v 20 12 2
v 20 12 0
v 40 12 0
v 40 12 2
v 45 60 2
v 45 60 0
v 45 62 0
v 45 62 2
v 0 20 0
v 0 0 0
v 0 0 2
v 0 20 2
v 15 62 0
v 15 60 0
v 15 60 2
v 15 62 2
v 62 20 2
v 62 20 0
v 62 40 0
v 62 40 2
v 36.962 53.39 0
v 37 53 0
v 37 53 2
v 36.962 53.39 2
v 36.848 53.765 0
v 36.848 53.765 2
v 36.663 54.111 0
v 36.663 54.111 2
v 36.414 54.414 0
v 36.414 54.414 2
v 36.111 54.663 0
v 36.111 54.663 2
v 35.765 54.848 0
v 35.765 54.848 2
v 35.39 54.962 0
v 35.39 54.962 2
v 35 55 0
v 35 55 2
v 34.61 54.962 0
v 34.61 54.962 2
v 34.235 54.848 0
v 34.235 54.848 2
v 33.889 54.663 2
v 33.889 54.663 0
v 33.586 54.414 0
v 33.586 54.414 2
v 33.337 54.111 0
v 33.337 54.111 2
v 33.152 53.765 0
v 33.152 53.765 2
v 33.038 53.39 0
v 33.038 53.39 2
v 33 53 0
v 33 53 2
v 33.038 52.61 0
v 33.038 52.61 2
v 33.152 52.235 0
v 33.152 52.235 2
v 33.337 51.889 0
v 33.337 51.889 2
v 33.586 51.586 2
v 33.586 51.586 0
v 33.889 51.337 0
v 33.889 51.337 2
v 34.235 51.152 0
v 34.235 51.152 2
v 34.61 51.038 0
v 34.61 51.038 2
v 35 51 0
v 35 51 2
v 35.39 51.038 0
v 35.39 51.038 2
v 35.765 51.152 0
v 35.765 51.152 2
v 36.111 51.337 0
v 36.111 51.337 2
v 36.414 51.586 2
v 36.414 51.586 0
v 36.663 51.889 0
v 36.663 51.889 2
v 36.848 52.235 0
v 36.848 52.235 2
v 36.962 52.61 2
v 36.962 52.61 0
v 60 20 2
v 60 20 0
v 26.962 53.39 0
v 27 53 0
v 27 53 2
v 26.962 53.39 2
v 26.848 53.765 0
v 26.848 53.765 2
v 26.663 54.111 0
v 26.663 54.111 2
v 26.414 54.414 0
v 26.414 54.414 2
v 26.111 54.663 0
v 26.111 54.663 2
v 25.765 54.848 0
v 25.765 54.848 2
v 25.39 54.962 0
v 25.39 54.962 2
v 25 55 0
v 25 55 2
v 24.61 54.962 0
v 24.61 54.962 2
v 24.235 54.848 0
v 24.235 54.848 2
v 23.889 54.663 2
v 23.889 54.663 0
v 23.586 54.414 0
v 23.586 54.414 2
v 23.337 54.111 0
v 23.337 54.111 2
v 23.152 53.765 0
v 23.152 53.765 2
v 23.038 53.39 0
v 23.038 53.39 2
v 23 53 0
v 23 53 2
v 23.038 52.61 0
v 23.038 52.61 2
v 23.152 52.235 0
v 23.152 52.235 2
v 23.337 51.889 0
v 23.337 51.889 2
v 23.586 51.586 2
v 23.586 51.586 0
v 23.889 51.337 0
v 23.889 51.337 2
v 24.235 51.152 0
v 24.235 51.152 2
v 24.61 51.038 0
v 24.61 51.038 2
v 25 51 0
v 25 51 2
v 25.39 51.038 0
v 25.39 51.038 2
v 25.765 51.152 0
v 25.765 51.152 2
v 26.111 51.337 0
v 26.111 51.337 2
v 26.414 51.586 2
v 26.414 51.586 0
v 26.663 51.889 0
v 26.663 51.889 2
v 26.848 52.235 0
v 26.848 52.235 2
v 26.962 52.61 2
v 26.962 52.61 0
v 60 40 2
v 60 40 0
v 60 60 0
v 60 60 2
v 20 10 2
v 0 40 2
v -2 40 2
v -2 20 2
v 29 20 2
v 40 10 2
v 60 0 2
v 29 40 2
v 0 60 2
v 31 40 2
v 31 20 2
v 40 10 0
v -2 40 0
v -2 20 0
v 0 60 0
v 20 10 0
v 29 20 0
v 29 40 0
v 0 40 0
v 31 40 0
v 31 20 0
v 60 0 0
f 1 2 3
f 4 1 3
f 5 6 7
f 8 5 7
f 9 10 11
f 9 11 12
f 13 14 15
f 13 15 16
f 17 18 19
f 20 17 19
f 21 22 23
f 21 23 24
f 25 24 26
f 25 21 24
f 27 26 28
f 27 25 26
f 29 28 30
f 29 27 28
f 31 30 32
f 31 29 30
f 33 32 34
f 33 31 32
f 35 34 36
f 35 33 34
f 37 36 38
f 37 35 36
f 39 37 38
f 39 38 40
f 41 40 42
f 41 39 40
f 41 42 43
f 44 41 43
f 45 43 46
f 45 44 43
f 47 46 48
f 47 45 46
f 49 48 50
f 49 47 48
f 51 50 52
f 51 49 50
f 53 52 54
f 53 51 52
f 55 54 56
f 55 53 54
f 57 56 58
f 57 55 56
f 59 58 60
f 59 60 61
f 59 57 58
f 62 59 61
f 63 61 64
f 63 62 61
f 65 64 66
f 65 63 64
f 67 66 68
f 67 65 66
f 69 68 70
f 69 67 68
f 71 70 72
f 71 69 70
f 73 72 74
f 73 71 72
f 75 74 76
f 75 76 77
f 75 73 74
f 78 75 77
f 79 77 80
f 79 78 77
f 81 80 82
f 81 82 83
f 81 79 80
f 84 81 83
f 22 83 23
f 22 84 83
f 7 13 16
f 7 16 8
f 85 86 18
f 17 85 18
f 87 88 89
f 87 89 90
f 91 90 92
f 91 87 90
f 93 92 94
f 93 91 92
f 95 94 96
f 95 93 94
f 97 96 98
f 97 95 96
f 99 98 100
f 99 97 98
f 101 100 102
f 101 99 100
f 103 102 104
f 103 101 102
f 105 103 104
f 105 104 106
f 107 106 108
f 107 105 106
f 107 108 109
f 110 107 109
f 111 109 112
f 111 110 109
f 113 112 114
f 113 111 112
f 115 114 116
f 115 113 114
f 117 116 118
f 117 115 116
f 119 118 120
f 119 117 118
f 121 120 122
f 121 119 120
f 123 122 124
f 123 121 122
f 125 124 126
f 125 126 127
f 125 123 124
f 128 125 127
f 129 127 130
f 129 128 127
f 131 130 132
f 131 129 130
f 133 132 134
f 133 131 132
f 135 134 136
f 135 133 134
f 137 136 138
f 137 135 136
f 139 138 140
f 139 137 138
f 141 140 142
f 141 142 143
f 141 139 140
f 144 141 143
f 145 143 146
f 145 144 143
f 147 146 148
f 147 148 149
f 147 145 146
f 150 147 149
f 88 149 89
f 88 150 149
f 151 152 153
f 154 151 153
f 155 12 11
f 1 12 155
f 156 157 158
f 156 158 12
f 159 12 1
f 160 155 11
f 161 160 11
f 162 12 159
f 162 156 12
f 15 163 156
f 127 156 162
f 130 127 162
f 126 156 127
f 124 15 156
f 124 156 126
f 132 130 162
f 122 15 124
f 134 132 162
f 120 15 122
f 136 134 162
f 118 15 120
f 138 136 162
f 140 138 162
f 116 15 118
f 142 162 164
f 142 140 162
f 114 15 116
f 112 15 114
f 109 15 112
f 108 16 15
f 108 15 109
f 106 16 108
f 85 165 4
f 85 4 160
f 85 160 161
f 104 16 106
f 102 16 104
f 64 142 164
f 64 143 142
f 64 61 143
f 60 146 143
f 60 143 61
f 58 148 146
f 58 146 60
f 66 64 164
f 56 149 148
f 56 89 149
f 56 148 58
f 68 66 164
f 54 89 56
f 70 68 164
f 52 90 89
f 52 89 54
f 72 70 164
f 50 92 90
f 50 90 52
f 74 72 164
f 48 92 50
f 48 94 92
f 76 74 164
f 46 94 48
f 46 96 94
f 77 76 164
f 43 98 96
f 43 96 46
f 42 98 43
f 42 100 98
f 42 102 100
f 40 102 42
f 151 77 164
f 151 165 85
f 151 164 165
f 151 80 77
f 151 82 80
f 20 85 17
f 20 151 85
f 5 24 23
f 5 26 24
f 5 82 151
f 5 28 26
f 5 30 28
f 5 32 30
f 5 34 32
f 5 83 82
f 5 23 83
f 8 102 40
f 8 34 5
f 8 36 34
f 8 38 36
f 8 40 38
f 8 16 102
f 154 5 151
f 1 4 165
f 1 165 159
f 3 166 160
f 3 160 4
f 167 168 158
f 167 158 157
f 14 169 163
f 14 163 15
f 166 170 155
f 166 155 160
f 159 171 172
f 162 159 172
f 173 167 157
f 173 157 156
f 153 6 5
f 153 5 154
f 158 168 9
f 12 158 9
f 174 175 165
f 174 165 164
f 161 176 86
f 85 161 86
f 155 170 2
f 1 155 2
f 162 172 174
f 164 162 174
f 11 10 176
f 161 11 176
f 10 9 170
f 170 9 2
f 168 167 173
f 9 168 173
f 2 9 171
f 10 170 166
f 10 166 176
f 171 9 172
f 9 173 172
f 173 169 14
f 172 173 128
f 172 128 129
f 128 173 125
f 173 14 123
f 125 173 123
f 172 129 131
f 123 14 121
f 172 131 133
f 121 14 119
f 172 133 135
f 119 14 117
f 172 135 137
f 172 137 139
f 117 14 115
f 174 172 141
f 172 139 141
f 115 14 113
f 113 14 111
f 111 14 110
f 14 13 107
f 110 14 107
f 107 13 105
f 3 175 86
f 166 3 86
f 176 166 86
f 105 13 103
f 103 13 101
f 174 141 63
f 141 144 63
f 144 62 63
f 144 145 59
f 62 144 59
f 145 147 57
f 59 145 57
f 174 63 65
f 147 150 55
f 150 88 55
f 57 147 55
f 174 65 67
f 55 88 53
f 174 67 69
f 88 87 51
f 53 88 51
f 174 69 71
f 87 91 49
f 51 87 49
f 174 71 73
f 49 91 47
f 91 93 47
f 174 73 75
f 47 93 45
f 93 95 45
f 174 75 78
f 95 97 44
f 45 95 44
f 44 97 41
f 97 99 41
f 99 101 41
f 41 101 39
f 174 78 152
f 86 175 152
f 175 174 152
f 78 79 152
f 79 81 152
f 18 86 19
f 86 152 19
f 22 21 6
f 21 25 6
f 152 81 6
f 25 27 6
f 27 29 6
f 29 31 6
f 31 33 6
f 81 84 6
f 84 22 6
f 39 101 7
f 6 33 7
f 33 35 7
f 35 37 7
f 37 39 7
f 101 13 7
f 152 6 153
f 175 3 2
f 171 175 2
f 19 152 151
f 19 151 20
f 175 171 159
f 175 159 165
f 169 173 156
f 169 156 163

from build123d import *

# Parameters (mm, degrees)
SKETCH_2_W      = 60
SKETCH_2_H      = 60
SKETCH_2_R      = 2
SKETCH_2_W_2    = 20
SKETCH_2_H_2    = 2
SKETCH_2_W_3    = 2
SKETCH_2_H_3    = 20
SKETCH_2_W_4    = 30
EXTRUDE_1_DEPTH = 2


with BuildPart() as part:
    # 草图2 → 凸台-拉伸1 (new body)
    # profile 1 of 4: a face of its own
    with BuildSketch(Plane.XY):
        with Locations((30, 30)):
            Rectangle(SKETCH_2_W, SKETCH_2_H)
        with Locations((25, 53)):
            Circle(SKETCH_2_R, mode=Mode.SUBTRACT)
        with Locations((35, 53)):
            Circle(SKETCH_2_R, mode=Mode.SUBTRACT)
        with Locations((30, 11)):
            Rectangle(SKETCH_2_W_2, SKETCH_2_H_2, mode=Mode.SUBTRACT)
        with Locations((30, 30)):
            Rectangle(SKETCH_2_W_3, SKETCH_2_H_3, mode=Mode.SUBTRACT)
    # profile 2 of 4: a face of its own
    with BuildSketch(Plane.XY):
        with Locations((30, 61)):
            Rectangle(SKETCH_2_W_4, SKETCH_2_H_2)
    # profile 3 of 4: a face of its own
    with BuildSketch(Plane.XY):
        with Locations((-1, 30)):
            Rectangle(SKETCH_2_W_3, SKETCH_2_H_3)
    # profile 4 of 4: a face of its own
    with BuildSketch(Plane.XY):
        with Locations((61, 30)):
            Rectangle(SKETCH_2_W_3, SKETCH_2_H_3)
    extrude(amount=EXTRUDE_1_DEPTH)


solid = part.part
